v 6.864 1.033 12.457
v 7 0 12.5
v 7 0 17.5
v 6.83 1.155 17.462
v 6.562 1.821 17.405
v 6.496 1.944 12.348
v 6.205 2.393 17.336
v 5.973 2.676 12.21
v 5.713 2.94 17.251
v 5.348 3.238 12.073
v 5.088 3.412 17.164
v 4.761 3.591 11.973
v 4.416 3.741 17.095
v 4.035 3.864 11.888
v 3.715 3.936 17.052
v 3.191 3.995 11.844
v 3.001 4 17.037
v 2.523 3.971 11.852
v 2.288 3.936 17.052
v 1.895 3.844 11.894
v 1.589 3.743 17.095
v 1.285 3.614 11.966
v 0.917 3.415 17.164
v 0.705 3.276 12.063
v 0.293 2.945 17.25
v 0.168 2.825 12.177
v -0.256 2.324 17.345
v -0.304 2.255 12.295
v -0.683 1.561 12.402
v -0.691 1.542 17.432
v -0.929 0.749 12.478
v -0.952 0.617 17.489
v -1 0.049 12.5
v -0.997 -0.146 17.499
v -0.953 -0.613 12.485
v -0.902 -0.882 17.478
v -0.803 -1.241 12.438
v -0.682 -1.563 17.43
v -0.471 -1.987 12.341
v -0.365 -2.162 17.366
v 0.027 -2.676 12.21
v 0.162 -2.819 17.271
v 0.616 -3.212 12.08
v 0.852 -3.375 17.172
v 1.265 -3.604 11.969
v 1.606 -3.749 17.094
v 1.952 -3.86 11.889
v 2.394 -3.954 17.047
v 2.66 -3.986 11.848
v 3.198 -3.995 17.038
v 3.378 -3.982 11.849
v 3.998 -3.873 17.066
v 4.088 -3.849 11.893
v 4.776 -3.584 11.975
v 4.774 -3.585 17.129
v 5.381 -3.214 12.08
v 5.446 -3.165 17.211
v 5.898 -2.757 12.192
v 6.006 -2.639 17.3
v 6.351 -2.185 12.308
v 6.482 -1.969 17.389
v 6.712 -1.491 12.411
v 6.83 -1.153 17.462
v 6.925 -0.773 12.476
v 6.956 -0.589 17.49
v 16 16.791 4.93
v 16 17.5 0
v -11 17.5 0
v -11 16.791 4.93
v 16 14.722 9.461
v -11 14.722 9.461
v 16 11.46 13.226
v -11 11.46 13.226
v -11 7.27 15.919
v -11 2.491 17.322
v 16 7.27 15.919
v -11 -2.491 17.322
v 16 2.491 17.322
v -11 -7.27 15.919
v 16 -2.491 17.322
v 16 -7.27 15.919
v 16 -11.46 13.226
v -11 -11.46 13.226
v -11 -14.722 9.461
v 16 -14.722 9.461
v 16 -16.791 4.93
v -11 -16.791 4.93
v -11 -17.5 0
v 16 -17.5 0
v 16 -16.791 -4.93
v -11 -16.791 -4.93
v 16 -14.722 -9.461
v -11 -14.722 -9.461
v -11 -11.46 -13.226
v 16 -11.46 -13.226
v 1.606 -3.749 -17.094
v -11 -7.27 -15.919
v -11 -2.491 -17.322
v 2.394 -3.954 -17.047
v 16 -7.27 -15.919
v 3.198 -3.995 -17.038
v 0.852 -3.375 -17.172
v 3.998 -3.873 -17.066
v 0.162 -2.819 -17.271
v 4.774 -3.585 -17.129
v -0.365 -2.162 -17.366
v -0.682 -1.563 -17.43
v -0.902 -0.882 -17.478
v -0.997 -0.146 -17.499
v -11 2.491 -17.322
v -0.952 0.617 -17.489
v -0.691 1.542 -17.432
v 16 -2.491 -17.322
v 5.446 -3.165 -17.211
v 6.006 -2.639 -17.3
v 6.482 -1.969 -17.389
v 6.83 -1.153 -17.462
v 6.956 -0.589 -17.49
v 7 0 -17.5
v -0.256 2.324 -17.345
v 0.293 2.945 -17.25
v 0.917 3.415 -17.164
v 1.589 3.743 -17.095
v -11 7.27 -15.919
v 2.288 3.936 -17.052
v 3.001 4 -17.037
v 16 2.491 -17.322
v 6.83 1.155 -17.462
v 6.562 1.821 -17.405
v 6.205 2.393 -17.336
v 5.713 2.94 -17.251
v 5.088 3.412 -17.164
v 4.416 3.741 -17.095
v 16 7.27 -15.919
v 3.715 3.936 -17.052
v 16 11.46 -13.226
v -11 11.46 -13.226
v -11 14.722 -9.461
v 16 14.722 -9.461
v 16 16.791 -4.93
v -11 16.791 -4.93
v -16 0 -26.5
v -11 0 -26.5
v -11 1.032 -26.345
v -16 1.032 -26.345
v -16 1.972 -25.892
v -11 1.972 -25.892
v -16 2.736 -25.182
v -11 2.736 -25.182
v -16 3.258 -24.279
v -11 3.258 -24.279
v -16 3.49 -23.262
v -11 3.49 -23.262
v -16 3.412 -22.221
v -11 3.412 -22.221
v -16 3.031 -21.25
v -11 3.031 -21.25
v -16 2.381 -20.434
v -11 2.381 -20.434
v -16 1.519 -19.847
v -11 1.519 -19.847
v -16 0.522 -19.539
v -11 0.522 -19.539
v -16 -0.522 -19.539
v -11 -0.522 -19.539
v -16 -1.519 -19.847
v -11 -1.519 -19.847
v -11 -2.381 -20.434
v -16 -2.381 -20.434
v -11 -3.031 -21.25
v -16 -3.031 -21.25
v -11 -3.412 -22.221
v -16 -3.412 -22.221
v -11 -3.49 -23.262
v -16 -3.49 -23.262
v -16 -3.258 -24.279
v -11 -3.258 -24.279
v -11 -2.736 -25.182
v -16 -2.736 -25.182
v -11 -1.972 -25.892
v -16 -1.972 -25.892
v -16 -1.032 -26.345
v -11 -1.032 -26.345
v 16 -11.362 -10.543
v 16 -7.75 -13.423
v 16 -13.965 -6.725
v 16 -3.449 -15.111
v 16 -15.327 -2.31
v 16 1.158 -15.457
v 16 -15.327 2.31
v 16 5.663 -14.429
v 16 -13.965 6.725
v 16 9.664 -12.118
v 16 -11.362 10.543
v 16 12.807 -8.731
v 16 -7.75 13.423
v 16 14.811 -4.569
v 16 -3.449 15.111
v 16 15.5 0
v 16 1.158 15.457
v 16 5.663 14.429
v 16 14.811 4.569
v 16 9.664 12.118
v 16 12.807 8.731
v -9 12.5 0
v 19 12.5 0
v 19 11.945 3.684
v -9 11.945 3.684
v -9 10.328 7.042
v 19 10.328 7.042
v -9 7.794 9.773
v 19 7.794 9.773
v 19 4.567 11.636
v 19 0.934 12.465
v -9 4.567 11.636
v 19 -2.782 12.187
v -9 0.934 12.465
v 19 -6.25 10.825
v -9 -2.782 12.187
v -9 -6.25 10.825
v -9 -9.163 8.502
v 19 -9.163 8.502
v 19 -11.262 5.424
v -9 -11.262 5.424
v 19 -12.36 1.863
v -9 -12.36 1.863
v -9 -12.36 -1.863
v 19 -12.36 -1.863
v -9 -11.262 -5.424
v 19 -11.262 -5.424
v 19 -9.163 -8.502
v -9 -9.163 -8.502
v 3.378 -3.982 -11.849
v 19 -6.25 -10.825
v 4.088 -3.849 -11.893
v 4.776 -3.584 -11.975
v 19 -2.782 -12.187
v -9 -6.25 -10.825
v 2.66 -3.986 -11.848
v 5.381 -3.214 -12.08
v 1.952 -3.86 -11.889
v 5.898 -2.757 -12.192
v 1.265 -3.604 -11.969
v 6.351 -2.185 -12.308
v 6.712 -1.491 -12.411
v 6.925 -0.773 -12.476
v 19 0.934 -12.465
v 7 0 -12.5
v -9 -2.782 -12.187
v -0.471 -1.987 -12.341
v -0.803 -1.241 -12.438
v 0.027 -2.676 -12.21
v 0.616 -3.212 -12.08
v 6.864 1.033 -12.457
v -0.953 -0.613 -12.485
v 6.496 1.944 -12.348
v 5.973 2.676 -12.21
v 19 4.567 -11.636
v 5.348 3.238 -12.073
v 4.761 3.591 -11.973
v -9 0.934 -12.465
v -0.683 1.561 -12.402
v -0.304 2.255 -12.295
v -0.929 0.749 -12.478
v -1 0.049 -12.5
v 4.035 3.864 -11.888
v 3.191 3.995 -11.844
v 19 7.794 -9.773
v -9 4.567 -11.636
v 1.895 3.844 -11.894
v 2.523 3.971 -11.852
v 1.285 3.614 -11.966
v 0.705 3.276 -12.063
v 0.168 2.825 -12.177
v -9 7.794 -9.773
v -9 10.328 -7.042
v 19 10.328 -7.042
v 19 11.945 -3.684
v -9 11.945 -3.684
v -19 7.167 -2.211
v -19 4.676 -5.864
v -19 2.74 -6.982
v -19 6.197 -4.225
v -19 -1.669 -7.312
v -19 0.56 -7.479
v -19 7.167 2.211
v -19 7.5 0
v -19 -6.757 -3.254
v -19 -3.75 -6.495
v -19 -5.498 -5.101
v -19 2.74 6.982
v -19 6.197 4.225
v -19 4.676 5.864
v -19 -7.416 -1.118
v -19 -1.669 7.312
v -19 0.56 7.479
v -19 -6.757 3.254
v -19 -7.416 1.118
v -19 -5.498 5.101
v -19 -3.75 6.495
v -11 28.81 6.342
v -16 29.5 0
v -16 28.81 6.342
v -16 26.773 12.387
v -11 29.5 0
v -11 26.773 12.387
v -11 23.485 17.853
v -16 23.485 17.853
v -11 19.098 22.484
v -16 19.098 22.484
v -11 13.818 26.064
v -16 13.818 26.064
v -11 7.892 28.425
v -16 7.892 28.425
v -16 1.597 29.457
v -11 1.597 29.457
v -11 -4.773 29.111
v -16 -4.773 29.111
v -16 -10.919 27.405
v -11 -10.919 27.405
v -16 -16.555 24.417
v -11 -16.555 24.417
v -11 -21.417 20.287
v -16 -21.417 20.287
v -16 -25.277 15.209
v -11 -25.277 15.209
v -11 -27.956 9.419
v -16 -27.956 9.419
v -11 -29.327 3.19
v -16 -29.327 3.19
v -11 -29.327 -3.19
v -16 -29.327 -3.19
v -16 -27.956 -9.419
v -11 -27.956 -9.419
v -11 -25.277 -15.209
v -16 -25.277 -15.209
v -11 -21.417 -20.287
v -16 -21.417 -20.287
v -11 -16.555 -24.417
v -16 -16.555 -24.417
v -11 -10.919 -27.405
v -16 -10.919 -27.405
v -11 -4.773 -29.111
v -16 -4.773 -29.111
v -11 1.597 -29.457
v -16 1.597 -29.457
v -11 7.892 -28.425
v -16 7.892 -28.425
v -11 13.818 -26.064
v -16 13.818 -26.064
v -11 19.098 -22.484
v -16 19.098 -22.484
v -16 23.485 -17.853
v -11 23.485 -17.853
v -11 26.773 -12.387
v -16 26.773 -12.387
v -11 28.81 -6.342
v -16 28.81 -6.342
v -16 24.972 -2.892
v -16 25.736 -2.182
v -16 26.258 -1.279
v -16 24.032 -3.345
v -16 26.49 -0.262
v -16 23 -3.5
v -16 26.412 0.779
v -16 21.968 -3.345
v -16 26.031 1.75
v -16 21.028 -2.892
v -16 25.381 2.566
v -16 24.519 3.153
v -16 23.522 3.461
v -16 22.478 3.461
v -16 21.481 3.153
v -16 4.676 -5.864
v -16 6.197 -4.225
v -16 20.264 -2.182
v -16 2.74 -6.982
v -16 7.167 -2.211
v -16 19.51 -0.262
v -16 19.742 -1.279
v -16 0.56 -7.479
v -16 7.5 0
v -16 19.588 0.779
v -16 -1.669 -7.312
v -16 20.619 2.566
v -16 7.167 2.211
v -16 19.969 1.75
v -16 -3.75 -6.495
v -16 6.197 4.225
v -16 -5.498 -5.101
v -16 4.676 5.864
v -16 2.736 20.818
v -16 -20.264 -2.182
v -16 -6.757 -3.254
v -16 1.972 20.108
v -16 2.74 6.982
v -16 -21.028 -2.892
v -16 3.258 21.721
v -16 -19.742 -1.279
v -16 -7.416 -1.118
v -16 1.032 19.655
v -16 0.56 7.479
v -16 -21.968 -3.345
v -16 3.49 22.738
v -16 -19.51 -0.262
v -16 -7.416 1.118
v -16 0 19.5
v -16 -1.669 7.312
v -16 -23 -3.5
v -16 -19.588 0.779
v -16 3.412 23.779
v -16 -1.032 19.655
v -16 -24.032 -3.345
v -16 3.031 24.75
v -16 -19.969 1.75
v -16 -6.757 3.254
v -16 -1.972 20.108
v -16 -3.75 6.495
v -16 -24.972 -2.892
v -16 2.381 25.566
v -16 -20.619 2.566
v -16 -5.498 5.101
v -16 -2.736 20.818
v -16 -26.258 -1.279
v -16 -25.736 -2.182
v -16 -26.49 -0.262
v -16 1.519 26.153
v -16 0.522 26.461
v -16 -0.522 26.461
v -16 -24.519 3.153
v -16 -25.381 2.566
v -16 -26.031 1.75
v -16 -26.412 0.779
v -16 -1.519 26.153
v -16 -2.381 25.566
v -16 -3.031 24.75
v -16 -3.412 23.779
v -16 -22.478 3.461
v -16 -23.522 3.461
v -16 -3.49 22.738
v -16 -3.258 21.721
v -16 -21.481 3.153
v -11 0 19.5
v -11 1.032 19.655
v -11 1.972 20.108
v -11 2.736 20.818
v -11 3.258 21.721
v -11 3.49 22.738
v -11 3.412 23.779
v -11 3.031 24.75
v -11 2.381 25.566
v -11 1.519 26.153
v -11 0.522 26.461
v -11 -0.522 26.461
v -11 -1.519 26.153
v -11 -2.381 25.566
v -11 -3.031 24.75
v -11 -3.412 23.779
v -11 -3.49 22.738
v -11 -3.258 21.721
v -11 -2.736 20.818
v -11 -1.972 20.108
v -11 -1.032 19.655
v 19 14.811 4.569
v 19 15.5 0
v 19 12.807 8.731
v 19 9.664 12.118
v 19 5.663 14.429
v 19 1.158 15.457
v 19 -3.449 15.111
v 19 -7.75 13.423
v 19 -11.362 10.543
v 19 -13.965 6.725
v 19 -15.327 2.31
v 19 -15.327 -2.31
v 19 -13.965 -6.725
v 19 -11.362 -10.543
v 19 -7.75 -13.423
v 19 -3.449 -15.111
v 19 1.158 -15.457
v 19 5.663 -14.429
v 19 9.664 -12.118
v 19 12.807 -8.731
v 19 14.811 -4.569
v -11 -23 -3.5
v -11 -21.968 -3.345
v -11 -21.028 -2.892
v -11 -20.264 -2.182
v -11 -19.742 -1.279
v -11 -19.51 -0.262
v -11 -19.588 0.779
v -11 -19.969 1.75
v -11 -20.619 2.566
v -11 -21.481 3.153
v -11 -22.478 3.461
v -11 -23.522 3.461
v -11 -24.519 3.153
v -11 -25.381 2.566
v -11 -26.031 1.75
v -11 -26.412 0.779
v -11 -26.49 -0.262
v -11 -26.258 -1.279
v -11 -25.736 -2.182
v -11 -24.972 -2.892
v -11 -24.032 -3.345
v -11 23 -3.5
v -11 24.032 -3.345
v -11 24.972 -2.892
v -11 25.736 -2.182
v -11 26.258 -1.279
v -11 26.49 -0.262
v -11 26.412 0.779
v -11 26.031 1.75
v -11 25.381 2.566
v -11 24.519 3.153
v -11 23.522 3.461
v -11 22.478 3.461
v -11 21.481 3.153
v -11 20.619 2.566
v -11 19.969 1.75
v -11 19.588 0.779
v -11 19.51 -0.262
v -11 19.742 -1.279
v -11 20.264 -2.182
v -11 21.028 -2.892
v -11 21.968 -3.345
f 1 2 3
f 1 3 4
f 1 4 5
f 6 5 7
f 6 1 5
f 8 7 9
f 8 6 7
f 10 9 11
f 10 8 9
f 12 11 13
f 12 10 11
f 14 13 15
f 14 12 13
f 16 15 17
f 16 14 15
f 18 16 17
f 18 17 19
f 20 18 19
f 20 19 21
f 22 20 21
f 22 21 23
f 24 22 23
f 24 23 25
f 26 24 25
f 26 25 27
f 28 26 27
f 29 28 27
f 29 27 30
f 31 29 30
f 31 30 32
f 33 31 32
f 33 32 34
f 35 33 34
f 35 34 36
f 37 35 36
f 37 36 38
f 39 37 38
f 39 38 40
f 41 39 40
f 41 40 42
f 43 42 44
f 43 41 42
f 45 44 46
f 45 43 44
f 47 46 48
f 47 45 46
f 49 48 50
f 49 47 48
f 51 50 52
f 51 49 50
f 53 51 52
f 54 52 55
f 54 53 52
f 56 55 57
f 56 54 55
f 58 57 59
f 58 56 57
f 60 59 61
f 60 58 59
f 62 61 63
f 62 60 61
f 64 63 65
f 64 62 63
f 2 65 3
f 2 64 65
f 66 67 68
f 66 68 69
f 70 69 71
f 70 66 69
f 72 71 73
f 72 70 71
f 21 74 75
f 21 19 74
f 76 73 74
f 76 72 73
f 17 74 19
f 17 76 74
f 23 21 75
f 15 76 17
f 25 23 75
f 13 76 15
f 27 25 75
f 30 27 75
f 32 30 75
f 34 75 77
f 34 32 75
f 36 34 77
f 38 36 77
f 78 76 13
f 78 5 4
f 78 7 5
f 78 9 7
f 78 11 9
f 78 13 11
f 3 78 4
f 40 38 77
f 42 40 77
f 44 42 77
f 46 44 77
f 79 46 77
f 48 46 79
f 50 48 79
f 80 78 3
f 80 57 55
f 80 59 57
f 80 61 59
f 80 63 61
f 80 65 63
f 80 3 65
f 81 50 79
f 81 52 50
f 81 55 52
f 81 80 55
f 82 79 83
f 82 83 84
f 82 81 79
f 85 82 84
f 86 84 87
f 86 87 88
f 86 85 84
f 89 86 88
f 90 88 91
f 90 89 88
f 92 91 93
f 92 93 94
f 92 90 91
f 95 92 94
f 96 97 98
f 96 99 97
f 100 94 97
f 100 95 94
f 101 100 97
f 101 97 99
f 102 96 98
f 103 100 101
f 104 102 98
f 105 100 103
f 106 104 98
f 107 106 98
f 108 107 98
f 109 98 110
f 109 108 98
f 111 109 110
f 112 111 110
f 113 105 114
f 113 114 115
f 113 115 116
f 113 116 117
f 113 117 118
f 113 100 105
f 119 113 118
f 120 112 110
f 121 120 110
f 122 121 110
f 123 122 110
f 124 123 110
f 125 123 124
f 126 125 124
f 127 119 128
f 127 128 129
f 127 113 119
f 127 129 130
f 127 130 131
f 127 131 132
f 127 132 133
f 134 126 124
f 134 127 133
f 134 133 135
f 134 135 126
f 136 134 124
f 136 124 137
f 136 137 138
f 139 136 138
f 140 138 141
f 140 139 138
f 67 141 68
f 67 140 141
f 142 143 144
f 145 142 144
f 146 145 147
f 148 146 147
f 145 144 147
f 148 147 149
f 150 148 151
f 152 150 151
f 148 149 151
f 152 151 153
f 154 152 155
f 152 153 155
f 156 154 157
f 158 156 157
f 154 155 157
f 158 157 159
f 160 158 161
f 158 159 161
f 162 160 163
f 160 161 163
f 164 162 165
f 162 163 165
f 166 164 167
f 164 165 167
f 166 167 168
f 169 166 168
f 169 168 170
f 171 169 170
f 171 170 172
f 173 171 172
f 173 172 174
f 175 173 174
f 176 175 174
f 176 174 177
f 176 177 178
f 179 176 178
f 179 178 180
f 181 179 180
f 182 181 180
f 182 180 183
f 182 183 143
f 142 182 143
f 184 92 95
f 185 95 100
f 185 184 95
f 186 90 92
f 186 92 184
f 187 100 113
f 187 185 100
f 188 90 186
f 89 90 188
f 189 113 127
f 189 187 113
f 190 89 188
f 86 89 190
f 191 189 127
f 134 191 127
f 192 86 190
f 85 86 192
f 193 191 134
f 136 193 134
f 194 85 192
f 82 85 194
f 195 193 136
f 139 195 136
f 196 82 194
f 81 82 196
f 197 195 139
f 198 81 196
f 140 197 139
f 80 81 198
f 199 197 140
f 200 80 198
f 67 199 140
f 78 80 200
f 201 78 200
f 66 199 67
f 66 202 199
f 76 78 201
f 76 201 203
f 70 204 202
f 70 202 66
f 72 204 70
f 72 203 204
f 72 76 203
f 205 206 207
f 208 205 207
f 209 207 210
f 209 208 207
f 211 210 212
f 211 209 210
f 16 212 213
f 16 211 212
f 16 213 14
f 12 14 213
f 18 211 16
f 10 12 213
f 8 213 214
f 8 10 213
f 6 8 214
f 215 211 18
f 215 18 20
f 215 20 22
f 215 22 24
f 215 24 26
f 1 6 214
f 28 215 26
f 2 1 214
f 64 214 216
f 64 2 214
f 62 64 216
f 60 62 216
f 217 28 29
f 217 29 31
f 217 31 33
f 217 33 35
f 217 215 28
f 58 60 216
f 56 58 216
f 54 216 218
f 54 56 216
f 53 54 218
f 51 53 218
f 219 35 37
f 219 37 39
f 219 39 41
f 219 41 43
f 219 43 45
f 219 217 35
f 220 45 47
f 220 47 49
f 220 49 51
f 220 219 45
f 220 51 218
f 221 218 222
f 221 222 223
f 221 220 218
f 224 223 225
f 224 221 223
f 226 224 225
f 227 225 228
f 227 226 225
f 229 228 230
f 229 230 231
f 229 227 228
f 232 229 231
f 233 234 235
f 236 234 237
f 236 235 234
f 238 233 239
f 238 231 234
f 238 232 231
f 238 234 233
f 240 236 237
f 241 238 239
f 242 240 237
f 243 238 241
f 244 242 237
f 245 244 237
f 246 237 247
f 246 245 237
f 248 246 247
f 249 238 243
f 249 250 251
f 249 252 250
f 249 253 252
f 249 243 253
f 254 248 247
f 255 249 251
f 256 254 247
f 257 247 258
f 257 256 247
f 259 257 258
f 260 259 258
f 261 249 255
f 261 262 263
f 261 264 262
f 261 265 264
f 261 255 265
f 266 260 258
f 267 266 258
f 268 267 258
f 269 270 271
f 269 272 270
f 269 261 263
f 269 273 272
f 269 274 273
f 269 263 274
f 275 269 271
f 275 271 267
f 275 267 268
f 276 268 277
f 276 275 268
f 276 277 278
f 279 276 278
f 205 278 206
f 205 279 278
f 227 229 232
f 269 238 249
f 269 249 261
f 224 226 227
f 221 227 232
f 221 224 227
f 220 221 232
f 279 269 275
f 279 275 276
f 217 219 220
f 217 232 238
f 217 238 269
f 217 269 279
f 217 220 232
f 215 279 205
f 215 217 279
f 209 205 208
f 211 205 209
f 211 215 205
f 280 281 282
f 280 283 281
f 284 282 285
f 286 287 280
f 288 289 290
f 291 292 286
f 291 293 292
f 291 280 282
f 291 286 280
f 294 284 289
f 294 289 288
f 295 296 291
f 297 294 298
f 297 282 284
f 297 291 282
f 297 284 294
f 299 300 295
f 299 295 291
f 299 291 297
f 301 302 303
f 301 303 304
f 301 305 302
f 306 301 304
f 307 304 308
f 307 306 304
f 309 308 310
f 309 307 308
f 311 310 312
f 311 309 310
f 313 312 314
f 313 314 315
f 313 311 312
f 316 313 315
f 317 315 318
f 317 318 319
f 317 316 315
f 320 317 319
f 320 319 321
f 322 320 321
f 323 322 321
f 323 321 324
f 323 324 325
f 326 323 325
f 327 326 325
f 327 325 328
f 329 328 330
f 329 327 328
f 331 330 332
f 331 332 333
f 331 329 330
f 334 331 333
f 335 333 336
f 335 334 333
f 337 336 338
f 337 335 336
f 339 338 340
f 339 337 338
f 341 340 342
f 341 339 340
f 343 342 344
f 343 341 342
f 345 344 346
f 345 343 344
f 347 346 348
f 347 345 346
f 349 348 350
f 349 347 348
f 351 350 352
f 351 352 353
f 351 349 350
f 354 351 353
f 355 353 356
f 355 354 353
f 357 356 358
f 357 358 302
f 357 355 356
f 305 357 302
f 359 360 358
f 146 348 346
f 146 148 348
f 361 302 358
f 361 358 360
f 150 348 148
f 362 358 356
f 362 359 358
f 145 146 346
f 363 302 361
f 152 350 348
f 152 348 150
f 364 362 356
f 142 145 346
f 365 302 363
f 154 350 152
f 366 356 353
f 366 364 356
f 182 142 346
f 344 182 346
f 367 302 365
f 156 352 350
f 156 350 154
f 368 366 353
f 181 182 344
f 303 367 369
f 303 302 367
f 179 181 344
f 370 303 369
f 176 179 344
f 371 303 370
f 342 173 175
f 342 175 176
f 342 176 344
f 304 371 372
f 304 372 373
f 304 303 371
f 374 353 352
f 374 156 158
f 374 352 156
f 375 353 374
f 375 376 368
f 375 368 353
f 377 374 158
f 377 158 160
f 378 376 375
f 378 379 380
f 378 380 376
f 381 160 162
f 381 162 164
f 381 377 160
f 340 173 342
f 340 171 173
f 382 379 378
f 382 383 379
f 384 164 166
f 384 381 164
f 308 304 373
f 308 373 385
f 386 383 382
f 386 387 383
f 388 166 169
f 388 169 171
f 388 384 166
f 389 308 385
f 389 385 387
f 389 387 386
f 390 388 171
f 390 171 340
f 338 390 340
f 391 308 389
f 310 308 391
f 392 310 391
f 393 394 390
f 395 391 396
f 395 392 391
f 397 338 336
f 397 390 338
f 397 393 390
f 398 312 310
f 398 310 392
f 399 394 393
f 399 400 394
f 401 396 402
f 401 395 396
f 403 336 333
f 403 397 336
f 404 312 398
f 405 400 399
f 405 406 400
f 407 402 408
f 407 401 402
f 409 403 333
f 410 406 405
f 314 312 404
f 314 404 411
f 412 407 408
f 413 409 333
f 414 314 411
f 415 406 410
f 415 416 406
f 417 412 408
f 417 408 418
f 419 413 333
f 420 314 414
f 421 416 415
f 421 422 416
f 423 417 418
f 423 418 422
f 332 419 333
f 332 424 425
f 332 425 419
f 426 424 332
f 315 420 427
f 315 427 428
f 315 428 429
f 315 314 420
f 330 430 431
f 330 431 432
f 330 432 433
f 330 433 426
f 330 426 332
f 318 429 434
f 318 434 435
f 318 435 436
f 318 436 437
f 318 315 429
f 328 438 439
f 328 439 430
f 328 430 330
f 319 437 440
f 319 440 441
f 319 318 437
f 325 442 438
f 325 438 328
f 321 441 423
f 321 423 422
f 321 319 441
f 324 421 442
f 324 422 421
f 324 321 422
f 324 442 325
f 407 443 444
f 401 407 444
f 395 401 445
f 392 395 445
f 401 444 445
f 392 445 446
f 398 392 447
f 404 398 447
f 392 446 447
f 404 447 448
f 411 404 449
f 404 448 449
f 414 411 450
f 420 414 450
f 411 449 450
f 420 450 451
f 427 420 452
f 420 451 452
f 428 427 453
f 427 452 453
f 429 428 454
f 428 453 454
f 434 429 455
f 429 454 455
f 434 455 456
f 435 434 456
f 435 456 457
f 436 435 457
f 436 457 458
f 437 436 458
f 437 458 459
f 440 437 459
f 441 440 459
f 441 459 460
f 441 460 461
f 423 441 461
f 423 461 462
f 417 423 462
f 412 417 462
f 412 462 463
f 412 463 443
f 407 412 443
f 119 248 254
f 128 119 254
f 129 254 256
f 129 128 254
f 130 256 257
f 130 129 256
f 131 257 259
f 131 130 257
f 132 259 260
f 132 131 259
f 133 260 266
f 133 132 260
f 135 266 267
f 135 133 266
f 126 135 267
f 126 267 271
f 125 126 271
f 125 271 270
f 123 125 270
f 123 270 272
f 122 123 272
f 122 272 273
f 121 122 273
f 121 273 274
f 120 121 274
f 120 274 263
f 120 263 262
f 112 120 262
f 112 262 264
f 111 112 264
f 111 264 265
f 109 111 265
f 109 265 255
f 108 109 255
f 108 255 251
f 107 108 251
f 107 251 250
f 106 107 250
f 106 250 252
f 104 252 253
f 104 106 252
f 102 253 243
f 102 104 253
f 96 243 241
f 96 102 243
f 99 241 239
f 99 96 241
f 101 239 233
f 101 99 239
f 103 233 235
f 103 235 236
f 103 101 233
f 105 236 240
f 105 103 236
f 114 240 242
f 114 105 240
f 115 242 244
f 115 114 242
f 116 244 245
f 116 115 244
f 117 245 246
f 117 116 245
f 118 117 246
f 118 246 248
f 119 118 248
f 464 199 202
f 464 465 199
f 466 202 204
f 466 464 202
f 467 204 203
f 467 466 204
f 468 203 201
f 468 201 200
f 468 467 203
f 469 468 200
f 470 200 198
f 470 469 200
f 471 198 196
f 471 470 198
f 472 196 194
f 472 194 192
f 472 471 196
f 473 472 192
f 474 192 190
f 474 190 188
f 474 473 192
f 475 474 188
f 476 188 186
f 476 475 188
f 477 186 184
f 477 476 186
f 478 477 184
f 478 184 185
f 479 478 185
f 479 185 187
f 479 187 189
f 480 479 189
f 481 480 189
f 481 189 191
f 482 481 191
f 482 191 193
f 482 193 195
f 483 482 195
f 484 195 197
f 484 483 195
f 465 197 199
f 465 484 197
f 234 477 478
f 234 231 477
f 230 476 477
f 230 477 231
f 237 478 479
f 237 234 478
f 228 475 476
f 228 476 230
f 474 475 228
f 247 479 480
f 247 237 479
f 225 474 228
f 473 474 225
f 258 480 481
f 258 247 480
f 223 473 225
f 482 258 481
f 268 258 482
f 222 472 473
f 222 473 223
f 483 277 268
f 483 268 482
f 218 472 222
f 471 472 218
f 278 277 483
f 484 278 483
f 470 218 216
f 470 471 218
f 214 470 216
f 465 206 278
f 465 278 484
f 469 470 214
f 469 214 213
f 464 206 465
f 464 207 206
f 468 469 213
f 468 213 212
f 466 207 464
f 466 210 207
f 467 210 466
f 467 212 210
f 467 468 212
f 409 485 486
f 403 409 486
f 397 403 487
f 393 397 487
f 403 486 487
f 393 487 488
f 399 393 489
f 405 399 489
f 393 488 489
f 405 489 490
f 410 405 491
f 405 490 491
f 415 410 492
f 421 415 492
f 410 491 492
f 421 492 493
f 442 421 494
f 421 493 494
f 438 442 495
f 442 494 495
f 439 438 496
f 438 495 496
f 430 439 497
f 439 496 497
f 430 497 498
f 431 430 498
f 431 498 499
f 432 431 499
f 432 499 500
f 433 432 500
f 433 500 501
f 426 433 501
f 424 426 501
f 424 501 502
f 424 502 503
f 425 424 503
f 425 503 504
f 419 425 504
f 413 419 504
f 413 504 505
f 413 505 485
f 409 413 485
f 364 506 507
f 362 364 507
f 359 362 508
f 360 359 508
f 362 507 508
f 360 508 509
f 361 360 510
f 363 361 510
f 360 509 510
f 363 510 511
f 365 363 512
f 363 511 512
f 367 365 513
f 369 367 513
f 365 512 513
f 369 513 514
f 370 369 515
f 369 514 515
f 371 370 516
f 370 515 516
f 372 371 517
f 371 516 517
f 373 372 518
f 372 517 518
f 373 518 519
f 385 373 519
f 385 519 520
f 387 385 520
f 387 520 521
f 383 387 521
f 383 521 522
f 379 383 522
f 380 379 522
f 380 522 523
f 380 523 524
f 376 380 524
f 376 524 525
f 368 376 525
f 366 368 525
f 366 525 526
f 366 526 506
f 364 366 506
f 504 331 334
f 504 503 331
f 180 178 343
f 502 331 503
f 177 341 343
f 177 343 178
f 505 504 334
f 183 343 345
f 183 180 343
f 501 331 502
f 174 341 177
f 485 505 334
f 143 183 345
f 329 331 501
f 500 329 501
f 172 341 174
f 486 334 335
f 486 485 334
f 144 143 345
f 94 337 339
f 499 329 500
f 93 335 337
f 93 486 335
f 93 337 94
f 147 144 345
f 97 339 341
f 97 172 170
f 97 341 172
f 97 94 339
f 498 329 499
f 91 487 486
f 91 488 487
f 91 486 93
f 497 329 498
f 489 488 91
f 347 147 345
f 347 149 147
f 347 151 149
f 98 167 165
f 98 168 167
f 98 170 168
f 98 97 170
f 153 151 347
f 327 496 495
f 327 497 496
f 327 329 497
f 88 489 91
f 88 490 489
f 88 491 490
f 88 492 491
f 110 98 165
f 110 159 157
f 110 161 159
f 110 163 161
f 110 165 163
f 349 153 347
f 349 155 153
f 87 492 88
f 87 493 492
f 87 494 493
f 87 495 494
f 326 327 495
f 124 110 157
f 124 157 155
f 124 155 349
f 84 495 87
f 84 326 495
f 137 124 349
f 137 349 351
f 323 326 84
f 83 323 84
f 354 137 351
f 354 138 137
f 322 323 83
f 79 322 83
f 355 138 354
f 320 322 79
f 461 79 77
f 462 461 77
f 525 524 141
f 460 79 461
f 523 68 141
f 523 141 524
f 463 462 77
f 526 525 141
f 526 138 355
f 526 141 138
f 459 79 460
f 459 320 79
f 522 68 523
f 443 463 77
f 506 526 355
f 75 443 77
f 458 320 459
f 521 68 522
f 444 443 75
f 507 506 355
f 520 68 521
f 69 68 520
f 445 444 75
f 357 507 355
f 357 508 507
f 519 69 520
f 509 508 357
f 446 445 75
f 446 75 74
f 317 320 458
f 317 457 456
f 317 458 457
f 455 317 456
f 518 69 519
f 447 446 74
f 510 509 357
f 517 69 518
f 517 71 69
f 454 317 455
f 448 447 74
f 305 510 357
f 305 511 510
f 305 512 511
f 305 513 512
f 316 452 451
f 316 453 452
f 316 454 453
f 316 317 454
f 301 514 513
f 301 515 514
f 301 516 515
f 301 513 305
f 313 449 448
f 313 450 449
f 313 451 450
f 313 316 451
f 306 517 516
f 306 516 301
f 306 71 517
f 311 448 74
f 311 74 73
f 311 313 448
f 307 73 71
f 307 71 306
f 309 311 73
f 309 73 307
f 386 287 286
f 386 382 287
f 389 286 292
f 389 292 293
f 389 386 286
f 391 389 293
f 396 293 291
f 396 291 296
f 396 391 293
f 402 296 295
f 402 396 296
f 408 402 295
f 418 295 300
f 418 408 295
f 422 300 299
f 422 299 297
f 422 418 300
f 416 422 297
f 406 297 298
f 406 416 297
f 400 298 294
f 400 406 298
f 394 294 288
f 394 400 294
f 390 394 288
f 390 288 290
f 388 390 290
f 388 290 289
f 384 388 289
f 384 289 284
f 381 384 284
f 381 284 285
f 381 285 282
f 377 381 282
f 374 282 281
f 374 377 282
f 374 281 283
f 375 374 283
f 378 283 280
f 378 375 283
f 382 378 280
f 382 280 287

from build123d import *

# Parameters (mm, degrees)
CUT_EXTRUDE1_REACH      = 53.386
SKETCH2_R               = 3.5
CUT_EXTRUDE2_DEPTH      = 46.84212037
CUT_EXTRUDE2_DEPTH_BACK = 46.84212037
SKETCH3_R               = 4


# Read off the part's stored shape, not the designer's step: Revolve1
with BuildPart() as part:
    # Revolve1 outline → Revolve1 (revolve)
    with BuildSketch(Plane.YX):
        Polygon((0, -9), (0, -19), (7.5, -19), (7.5, -16), (29.5, -16), (29.5, -11), (17.5, -11), (17.5, 16), (15.5, 16), (15.5, 19), (12.5, 19), (12.5, -9), align=None)
    revolve(axis=Axis((0, 0, 0), (1, 0, 0)))

    # Sketch2 → Cut-Extrude1 (cut, up to next)
    with BuildSketch(Plane(origin=(-11, 0, 0), x_dir=(0, 0, -1), z_dir=(1, 0, 0)), mode=Mode.PRIVATE) as cut_extrude1_sk1:
        with Locations((0, 23)):
            Circle(SKETCH2_R)
    cut_extrude1_tool1 = extrude(cut_extrude1_sk1.sketch, amount=-CUT_EXTRUDE1_REACH, mode=Mode.PRIVATE) & part.part
    # Sketch2 → Cut-Extrude1 (cut, up to next)
    with BuildSketch(Plane(origin=(-11, 0, 0), x_dir=(0, 0, -1), z_dir=(1, 0, 0)), mode=Mode.PRIVATE) as cut_extrude1_sk2:
        with Locations((23, 0)):
            Circle(SKETCH2_R)
    cut_extrude1_tool2 = extrude(cut_extrude1_sk2.sketch, amount=-CUT_EXTRUDE1_REACH, mode=Mode.PRIVATE) & part.part
    # Sketch2 → Cut-Extrude1 (cut, up to next)
    with BuildSketch(Plane(origin=(-11, 0, 0), x_dir=(0, 0, -1), z_dir=(1, 0, 0)), mode=Mode.PRIVATE) as cut_extrude1_sk3:
        with Locations((0, -23)):
            Circle(SKETCH2_R)
    cut_extrude1_tool3 = extrude(cut_extrude1_sk3.sketch, amount=-CUT_EXTRUDE1_REACH, mode=Mode.PRIVATE) & part.part
    # Sketch2 → Cut-Extrude1 (cut, up to next)
    with BuildSketch(Plane(origin=(-11, 0, 0), x_dir=(0, 0, -1), z_dir=(1, 0, 0)), mode=Mode.PRIVATE) as cut_extrude1_sk4:
        with Locations((-23, 0)):
            Circle(SKETCH2_R)
    cut_extrude1_tool4 = extrude(cut_extrude1_sk4.sketch, amount=-CUT_EXTRUDE1_REACH, mode=Mode.PRIVATE) & part.part
    add(cut_extrude1_tool1.solids().sort_by_distance((-11, 23, 0))[0], mode=Mode.SUBTRACT)
    add(cut_extrude1_tool2.solids().sort_by_distance((-11, 0, -23))[0], mode=Mode.SUBTRACT)
    add(cut_extrude1_tool3.solids().sort_by_distance((-11, -23, 0))[0], mode=Mode.SUBTRACT)
    add(cut_extrude1_tool4.solids().sort_by_distance((-11, 0, 23))[0], mode=Mode.SUBTRACT)

    # Sketch3 → Cut-Extrude2 (cut, two sides: drawn at the far end of the back side and taken through both)
    with BuildSketch(Plane.XY.offset(-CUT_EXTRUDE2_DEPTH_BACK)):
        with Locations((3, 0)):
            Circle(SKETCH3_R)
    extrude(amount=CUT_EXTRUDE2_DEPTH + CUT_EXTRUDE2_DEPTH_BACK, mode=Mode.SUBTRACT)


solid = part.part
